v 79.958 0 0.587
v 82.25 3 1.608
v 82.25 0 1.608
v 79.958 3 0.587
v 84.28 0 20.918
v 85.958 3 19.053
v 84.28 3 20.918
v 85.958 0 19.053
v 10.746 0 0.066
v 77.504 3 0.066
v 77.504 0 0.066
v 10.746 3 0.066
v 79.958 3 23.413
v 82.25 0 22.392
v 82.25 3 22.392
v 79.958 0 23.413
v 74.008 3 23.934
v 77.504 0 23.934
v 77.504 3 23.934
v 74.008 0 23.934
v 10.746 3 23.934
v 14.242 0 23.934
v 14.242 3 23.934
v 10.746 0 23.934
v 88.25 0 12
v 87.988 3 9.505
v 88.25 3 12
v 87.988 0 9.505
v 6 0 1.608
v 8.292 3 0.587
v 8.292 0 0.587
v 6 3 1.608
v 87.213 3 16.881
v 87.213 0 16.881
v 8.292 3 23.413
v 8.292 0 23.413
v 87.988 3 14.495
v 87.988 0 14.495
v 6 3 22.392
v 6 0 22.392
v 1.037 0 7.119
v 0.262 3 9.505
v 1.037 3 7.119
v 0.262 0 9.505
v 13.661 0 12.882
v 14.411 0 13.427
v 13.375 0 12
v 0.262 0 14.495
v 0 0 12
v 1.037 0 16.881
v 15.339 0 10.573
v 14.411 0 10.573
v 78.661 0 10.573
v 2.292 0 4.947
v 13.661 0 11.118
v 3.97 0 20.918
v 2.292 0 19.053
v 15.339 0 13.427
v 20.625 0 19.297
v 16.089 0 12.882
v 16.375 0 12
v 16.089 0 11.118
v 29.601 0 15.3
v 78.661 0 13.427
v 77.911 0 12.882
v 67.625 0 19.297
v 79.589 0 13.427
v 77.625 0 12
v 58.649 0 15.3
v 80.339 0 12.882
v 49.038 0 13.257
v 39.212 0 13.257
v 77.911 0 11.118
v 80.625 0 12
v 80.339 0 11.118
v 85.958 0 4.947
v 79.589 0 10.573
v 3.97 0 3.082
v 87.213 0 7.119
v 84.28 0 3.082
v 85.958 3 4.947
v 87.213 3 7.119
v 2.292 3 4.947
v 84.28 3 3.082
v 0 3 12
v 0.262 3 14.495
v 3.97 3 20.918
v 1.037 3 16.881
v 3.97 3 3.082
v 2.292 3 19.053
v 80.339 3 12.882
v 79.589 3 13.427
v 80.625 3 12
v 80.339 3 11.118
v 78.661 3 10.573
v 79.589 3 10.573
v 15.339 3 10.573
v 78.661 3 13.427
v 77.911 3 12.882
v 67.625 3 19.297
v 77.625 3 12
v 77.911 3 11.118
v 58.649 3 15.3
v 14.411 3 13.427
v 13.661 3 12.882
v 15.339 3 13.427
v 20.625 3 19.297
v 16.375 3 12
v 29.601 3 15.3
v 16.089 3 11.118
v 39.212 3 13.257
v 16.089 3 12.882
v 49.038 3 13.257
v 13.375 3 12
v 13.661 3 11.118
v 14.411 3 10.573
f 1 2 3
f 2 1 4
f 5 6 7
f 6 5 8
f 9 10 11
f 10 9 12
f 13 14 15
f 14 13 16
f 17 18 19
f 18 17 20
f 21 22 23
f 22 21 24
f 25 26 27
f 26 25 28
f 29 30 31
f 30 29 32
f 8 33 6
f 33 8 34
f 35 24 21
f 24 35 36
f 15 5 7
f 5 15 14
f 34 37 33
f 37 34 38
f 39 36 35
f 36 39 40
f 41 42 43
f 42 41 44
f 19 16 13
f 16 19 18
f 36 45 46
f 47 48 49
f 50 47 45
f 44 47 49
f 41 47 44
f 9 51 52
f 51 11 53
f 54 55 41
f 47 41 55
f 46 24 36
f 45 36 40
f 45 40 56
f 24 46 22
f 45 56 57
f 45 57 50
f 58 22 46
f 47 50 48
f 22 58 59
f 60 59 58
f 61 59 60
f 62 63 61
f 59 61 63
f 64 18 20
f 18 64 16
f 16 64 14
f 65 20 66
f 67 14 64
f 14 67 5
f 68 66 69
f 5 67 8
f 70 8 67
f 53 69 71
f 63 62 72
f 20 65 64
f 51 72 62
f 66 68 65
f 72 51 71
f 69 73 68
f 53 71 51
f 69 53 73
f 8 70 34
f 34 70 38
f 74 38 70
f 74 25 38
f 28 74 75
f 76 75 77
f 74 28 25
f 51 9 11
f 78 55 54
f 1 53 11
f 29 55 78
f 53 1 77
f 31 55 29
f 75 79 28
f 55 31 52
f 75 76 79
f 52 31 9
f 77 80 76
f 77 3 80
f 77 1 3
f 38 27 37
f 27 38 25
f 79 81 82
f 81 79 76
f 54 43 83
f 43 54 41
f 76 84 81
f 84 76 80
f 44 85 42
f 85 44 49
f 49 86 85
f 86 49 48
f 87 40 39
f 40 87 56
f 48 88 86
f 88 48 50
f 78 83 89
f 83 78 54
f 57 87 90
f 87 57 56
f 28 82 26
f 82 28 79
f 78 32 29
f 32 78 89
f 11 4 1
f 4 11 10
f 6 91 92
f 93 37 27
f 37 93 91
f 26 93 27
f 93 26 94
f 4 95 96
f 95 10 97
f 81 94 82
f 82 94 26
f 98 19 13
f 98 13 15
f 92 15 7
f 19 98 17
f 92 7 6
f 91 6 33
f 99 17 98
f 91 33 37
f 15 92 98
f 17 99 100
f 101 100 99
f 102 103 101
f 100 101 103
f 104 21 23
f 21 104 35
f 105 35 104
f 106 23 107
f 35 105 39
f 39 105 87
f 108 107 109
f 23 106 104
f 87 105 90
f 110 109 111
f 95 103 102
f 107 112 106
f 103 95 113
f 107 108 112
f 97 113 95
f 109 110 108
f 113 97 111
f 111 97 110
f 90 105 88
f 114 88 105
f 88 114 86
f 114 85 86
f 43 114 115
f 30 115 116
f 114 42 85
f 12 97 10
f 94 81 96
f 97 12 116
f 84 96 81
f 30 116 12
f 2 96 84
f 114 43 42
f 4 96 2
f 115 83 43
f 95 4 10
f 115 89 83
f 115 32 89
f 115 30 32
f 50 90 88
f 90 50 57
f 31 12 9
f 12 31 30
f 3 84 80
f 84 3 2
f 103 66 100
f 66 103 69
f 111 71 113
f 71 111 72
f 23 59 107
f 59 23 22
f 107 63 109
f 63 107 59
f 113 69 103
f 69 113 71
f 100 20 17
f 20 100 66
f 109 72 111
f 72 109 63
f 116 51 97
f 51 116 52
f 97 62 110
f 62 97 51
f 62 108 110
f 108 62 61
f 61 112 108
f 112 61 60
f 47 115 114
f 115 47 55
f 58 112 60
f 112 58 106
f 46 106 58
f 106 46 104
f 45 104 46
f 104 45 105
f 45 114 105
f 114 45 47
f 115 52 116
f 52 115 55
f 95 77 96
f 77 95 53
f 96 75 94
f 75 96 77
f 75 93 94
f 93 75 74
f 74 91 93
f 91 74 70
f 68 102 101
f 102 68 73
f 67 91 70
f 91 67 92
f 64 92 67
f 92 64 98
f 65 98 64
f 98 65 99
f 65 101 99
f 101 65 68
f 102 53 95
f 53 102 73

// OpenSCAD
// file: utils.scad
// Author: Mihai Oltean, https://mihaioltean.github.io, mihai.oltean@gmail.com
// More details: https://jenny5.org, https://jenny5-robot.github.io/
// Source code: github.com/jenny5-robot
// License: MIT
//--------------------------------------------------------------
module corner(radius, height)
{
	difference(){
		cube ([radius, radius, height]);
		cylinder	(h = height, r = radius, $fn = 30);
	}
}
//---------------------------------------------------------------
module spherical_corner(radius)
{
	difference(){
		cube ([radius, radius, radius]);
		sphere(r = radius, $fn = 40);
	}
}
//---------------------------------------------------------------
module spherical_column(height, radius)
{
		difference(){
			cube ([height, height, height]);
			cylinder(h= height, r = radius, $fn = 50);
		}
}
//---------------------------------------------------------------

spherical_column(height = 100, radius = 10);
// file: tolerance.scad
// Author: Mihai Oltean, https://mihaioltean.github.io, mihai.oltean@gmail.com
// More details: https://jenny5.org, https://jenny5-robot.github.io/
// Source code: github.com/jenny5-robot
// MIT License
//--------------------------------------------------------------

tolerance = 0.1;
display_tolerance = 1;

overlap_tolerance = 0.01;

tolerance_z = [0, 0, tolerance];
tolerance_x = [tolerance, 0, 0];
tolerance_y = [0, tolerance, 0];

display_tolerance_z = [0, 0, display_tolerance];
display_tolerance_x = [display_tolerance, 0, 0];
display_tolerance_y = [0, display_tolerance, 0];

display_tolerance_xz = [display_tolerance, 0, display_tolerance];
display_tolerance_xy = [display_tolerance, display_tolerance, 0];
display_tolerance_yz = [0, display_tolerance, display_tolerance];

display_tolerance_xyz = [display_tolerance, display_tolerance, display_tolerance];
// file: params_webcam.scad
// Author: Mihai Oltean, https://mihaioltean.github.io, mihai.oltean@gmail.com
// More details: https://jenny5.org, https://jenny5-robot.github.io/
// Source code: github.com/jenny5-robot
// MIT License
//--------------------------------------------------------------

c920_length = 94;
c920_height = 29;
c920_depth = 24;

c920_size = [c920_length, c920_depth, c920_height];

c920_dist_between_holder_holes = 64.25;

c920_dist_to_cable = 34;
// file: params_basic_components.scad
// Author: Mihai Oltean, https://mihaioltean.github.io, mihai.oltean@gmail.com
// More details: https://jenny5.org, https://jenny5-robot.github.io/
// Source code: github.com/jenny5-robot
// MIT License
//--------------------------------------------------------------

spring_length = 20;

smooth_rod_8_radius = 4;
smooth_rod_10_radius = 5;
smooth_rod_12_radius = 6;

wall_thick_1 = 1;
wall_thick_2 = 2;
wall_thick_3 = 3;
wall_thick_4 = 4;
wall_thick_5 = 5;
wall_thick_5_5 = 5.5;
wall_thick_6 = 6;
wall_thick_7 = 7;
wall_thick_8 = 8;
wall_thick_9 = 9;
wall_thick_10 = 10;
wall_thick_12 = 12;
// file: params_screws_nuts_washers.scad
// Author: Mihai Oltean, https://mihaioltean.github.io, mihai.oltean@gmail.com
// More details: https://jenny5.org, https://jenny5-robot.github.io/
// Source code: github.com/jenny5-robot
// MIT License
//--------------------------------------------------------------


m2_screw_radius = 1;
m2_nut_radius = 2.2;
m2_nut_height = 1.6;
m2_nut_thick = m2_nut_height;

m3_screw_radius = 1.5;
m3_nut_radius = 3.1;
m3_nut_height = 2.3;
m3_nut_thick = m3_nut_height;
m3_autolock_nut_thick = 4.2;

m4_screw_radius = 2;
m4_nut_radius = 4;
m4_auto_lock_nut_height = 5;
m4_nut_height = 3.25;
m4_nut_thick = 3.25;

m5_screw_radius = 2.5;
m5_nut_radius = 4.6;
m5_nut_height = 4;

m6_screw_radius = 3;
m6_nut_radius = 5.65;
m6_nut_thick = 5;
m6_nut_slim_thick = 3;
m6_autolock_nut_thick = 6;
m6_long_nut_thick = 9;

M8_screw_head_height = 5.7;
M8_screw_radius = 3.9;
M8_nut_small_width = 12.8;
M8_nut_radius = 7.3;
M8_slim_nut_small_width = 12.4;
M8_nut_thick = 6.5;
M8_nut_height = M8_nut_thick;
M8_slim_nut_height = 5.5;
M8_screw_head_radius = 6.5;
M8_autolock_nut_thick = 8;

M10_screw_radius = 5;
M10_nut_thick = 8;
M10_nut_radius = 9.8;

M12_screw_radius = 6;
M12_nut_thick = 10;
M12_nut_radius = 11;
M12_long_long_nut_thick = 36;
M12_long_nut_thick = 36;
M12_autolock_nut_thick = 14;

M10_long_nut_radius = 9.71;
M10_long_nut_height = 29.8;

M10_long_thick_nut_radius = 7.41;
M10_long_thick_nut_height = 30.4;

M12_plastic_nut_radius = 10.45;
M12_plastic_nut_height = 23.3;

tr12_3_nut_radius = 11;
tr12_3_nut_height = 18.1;

washer_5 = 0.97;

washer_4_12_radius = 6;
washer_4_12_external_radius = 6;
washer_4_12_thick = 1;
washer_4_thick = 1;
washer_4_12_internal_radius = 2.15;

washer_4_9_external_radius = 4.5;
washer_4_9_internal_radius = 2.15;
washer_4_9_thick = 1;

washer_6_thick = 1.7;
washer_8_thick = 1.5;

washer_10_height = 2;
washer_10_thick = 2;

washer_12_thick = 2;

washer_5_15_external_radius = 7.5;
washer_5_15_thick = 1;
washer_5_thick = 1;
washer_5_15_internal_radius = 2.65;
// file: material_colors.scad
// Author: Mihai Oltean, https://mihaioltean.github.io, mihai.oltean@gmail.com
// More details: https://jenny5.org, https://jenny5-robot.github.io/
// Source code: github.com/jenny5-robot
// MIT License
//--------------------------------------------------------------

aluminium_color = "Silver";
screw_color = "LightSlateGray";
frame_color = aluminium_color;
shaft_color = "Silver";
plastic_color = "Yellow";
pulley_color = "DarkSlateGray";
steel_color = "LightSlateGray";
wood_color = "Maroon";
// main file
// Author: Mihai Oltean, https://mihaioltean.github.io, mihai.oltean@gmail.com
// More details: https://jenny5.org, https://jenny5-robot.github.io/
// Source code: github.com/jenny5-robot
// MIT License
//--------------------------------------------------------------

include <material_colors.scad>
include <params_screws_nuts_washers.scad>
use <basic_components.scad>
include <params_basic_components.scad>
include <params_webcam.scad>
include <tolerance.scad>

//--------------------------------------------------------------
module c920_support()
{
  color(plastic_color) 
  difference(){
    translate ([c920_depth / 2, wall_thick_3, c920_depth / 2])
      rotate([90, 0, 0]) 
        hull(){
          cylinder(h = wall_thick_3, r = c920_depth / 2);
          translate ([c920_dist_between_holder_holes, 0, 0]) cylinder(h = wall_thick_3, r = c920_depth / 2);
        }
        // remove some parts in order to avoid interference with US sensor
        translate ([c920_dist_between_holder_holes / 2 + c920_depth / 2, 0, 60] - display_tolerance_y) rotate([-90, 0, 0]) cylinder (h = wall_thick_3 + 2 * display_tolerance, r = c920_length / 2);
        // holder screws
        translate ([c920_length / 2 - c920_dist_between_holder_holes / 2, 0, c920_depth / 2] - display_tolerance_y) rotate ([-90, 0, 0]) cylinder (h = wall_thick_3 + 2 * display_tolerance, r = m3_screw_radius, $fn = 10);
        translate ([c920_length / 2 + c920_dist_between_holder_holes / 2, 0, c920_depth / 2] - display_tolerance_y) rotate ([-90, 0, 0]) cylinder (h = wall_thick_3 + 2 * display_tolerance, r = m3_screw_radius, $fn = 10);
  }
}
//--------------------------------------------------------------


c920_support();
